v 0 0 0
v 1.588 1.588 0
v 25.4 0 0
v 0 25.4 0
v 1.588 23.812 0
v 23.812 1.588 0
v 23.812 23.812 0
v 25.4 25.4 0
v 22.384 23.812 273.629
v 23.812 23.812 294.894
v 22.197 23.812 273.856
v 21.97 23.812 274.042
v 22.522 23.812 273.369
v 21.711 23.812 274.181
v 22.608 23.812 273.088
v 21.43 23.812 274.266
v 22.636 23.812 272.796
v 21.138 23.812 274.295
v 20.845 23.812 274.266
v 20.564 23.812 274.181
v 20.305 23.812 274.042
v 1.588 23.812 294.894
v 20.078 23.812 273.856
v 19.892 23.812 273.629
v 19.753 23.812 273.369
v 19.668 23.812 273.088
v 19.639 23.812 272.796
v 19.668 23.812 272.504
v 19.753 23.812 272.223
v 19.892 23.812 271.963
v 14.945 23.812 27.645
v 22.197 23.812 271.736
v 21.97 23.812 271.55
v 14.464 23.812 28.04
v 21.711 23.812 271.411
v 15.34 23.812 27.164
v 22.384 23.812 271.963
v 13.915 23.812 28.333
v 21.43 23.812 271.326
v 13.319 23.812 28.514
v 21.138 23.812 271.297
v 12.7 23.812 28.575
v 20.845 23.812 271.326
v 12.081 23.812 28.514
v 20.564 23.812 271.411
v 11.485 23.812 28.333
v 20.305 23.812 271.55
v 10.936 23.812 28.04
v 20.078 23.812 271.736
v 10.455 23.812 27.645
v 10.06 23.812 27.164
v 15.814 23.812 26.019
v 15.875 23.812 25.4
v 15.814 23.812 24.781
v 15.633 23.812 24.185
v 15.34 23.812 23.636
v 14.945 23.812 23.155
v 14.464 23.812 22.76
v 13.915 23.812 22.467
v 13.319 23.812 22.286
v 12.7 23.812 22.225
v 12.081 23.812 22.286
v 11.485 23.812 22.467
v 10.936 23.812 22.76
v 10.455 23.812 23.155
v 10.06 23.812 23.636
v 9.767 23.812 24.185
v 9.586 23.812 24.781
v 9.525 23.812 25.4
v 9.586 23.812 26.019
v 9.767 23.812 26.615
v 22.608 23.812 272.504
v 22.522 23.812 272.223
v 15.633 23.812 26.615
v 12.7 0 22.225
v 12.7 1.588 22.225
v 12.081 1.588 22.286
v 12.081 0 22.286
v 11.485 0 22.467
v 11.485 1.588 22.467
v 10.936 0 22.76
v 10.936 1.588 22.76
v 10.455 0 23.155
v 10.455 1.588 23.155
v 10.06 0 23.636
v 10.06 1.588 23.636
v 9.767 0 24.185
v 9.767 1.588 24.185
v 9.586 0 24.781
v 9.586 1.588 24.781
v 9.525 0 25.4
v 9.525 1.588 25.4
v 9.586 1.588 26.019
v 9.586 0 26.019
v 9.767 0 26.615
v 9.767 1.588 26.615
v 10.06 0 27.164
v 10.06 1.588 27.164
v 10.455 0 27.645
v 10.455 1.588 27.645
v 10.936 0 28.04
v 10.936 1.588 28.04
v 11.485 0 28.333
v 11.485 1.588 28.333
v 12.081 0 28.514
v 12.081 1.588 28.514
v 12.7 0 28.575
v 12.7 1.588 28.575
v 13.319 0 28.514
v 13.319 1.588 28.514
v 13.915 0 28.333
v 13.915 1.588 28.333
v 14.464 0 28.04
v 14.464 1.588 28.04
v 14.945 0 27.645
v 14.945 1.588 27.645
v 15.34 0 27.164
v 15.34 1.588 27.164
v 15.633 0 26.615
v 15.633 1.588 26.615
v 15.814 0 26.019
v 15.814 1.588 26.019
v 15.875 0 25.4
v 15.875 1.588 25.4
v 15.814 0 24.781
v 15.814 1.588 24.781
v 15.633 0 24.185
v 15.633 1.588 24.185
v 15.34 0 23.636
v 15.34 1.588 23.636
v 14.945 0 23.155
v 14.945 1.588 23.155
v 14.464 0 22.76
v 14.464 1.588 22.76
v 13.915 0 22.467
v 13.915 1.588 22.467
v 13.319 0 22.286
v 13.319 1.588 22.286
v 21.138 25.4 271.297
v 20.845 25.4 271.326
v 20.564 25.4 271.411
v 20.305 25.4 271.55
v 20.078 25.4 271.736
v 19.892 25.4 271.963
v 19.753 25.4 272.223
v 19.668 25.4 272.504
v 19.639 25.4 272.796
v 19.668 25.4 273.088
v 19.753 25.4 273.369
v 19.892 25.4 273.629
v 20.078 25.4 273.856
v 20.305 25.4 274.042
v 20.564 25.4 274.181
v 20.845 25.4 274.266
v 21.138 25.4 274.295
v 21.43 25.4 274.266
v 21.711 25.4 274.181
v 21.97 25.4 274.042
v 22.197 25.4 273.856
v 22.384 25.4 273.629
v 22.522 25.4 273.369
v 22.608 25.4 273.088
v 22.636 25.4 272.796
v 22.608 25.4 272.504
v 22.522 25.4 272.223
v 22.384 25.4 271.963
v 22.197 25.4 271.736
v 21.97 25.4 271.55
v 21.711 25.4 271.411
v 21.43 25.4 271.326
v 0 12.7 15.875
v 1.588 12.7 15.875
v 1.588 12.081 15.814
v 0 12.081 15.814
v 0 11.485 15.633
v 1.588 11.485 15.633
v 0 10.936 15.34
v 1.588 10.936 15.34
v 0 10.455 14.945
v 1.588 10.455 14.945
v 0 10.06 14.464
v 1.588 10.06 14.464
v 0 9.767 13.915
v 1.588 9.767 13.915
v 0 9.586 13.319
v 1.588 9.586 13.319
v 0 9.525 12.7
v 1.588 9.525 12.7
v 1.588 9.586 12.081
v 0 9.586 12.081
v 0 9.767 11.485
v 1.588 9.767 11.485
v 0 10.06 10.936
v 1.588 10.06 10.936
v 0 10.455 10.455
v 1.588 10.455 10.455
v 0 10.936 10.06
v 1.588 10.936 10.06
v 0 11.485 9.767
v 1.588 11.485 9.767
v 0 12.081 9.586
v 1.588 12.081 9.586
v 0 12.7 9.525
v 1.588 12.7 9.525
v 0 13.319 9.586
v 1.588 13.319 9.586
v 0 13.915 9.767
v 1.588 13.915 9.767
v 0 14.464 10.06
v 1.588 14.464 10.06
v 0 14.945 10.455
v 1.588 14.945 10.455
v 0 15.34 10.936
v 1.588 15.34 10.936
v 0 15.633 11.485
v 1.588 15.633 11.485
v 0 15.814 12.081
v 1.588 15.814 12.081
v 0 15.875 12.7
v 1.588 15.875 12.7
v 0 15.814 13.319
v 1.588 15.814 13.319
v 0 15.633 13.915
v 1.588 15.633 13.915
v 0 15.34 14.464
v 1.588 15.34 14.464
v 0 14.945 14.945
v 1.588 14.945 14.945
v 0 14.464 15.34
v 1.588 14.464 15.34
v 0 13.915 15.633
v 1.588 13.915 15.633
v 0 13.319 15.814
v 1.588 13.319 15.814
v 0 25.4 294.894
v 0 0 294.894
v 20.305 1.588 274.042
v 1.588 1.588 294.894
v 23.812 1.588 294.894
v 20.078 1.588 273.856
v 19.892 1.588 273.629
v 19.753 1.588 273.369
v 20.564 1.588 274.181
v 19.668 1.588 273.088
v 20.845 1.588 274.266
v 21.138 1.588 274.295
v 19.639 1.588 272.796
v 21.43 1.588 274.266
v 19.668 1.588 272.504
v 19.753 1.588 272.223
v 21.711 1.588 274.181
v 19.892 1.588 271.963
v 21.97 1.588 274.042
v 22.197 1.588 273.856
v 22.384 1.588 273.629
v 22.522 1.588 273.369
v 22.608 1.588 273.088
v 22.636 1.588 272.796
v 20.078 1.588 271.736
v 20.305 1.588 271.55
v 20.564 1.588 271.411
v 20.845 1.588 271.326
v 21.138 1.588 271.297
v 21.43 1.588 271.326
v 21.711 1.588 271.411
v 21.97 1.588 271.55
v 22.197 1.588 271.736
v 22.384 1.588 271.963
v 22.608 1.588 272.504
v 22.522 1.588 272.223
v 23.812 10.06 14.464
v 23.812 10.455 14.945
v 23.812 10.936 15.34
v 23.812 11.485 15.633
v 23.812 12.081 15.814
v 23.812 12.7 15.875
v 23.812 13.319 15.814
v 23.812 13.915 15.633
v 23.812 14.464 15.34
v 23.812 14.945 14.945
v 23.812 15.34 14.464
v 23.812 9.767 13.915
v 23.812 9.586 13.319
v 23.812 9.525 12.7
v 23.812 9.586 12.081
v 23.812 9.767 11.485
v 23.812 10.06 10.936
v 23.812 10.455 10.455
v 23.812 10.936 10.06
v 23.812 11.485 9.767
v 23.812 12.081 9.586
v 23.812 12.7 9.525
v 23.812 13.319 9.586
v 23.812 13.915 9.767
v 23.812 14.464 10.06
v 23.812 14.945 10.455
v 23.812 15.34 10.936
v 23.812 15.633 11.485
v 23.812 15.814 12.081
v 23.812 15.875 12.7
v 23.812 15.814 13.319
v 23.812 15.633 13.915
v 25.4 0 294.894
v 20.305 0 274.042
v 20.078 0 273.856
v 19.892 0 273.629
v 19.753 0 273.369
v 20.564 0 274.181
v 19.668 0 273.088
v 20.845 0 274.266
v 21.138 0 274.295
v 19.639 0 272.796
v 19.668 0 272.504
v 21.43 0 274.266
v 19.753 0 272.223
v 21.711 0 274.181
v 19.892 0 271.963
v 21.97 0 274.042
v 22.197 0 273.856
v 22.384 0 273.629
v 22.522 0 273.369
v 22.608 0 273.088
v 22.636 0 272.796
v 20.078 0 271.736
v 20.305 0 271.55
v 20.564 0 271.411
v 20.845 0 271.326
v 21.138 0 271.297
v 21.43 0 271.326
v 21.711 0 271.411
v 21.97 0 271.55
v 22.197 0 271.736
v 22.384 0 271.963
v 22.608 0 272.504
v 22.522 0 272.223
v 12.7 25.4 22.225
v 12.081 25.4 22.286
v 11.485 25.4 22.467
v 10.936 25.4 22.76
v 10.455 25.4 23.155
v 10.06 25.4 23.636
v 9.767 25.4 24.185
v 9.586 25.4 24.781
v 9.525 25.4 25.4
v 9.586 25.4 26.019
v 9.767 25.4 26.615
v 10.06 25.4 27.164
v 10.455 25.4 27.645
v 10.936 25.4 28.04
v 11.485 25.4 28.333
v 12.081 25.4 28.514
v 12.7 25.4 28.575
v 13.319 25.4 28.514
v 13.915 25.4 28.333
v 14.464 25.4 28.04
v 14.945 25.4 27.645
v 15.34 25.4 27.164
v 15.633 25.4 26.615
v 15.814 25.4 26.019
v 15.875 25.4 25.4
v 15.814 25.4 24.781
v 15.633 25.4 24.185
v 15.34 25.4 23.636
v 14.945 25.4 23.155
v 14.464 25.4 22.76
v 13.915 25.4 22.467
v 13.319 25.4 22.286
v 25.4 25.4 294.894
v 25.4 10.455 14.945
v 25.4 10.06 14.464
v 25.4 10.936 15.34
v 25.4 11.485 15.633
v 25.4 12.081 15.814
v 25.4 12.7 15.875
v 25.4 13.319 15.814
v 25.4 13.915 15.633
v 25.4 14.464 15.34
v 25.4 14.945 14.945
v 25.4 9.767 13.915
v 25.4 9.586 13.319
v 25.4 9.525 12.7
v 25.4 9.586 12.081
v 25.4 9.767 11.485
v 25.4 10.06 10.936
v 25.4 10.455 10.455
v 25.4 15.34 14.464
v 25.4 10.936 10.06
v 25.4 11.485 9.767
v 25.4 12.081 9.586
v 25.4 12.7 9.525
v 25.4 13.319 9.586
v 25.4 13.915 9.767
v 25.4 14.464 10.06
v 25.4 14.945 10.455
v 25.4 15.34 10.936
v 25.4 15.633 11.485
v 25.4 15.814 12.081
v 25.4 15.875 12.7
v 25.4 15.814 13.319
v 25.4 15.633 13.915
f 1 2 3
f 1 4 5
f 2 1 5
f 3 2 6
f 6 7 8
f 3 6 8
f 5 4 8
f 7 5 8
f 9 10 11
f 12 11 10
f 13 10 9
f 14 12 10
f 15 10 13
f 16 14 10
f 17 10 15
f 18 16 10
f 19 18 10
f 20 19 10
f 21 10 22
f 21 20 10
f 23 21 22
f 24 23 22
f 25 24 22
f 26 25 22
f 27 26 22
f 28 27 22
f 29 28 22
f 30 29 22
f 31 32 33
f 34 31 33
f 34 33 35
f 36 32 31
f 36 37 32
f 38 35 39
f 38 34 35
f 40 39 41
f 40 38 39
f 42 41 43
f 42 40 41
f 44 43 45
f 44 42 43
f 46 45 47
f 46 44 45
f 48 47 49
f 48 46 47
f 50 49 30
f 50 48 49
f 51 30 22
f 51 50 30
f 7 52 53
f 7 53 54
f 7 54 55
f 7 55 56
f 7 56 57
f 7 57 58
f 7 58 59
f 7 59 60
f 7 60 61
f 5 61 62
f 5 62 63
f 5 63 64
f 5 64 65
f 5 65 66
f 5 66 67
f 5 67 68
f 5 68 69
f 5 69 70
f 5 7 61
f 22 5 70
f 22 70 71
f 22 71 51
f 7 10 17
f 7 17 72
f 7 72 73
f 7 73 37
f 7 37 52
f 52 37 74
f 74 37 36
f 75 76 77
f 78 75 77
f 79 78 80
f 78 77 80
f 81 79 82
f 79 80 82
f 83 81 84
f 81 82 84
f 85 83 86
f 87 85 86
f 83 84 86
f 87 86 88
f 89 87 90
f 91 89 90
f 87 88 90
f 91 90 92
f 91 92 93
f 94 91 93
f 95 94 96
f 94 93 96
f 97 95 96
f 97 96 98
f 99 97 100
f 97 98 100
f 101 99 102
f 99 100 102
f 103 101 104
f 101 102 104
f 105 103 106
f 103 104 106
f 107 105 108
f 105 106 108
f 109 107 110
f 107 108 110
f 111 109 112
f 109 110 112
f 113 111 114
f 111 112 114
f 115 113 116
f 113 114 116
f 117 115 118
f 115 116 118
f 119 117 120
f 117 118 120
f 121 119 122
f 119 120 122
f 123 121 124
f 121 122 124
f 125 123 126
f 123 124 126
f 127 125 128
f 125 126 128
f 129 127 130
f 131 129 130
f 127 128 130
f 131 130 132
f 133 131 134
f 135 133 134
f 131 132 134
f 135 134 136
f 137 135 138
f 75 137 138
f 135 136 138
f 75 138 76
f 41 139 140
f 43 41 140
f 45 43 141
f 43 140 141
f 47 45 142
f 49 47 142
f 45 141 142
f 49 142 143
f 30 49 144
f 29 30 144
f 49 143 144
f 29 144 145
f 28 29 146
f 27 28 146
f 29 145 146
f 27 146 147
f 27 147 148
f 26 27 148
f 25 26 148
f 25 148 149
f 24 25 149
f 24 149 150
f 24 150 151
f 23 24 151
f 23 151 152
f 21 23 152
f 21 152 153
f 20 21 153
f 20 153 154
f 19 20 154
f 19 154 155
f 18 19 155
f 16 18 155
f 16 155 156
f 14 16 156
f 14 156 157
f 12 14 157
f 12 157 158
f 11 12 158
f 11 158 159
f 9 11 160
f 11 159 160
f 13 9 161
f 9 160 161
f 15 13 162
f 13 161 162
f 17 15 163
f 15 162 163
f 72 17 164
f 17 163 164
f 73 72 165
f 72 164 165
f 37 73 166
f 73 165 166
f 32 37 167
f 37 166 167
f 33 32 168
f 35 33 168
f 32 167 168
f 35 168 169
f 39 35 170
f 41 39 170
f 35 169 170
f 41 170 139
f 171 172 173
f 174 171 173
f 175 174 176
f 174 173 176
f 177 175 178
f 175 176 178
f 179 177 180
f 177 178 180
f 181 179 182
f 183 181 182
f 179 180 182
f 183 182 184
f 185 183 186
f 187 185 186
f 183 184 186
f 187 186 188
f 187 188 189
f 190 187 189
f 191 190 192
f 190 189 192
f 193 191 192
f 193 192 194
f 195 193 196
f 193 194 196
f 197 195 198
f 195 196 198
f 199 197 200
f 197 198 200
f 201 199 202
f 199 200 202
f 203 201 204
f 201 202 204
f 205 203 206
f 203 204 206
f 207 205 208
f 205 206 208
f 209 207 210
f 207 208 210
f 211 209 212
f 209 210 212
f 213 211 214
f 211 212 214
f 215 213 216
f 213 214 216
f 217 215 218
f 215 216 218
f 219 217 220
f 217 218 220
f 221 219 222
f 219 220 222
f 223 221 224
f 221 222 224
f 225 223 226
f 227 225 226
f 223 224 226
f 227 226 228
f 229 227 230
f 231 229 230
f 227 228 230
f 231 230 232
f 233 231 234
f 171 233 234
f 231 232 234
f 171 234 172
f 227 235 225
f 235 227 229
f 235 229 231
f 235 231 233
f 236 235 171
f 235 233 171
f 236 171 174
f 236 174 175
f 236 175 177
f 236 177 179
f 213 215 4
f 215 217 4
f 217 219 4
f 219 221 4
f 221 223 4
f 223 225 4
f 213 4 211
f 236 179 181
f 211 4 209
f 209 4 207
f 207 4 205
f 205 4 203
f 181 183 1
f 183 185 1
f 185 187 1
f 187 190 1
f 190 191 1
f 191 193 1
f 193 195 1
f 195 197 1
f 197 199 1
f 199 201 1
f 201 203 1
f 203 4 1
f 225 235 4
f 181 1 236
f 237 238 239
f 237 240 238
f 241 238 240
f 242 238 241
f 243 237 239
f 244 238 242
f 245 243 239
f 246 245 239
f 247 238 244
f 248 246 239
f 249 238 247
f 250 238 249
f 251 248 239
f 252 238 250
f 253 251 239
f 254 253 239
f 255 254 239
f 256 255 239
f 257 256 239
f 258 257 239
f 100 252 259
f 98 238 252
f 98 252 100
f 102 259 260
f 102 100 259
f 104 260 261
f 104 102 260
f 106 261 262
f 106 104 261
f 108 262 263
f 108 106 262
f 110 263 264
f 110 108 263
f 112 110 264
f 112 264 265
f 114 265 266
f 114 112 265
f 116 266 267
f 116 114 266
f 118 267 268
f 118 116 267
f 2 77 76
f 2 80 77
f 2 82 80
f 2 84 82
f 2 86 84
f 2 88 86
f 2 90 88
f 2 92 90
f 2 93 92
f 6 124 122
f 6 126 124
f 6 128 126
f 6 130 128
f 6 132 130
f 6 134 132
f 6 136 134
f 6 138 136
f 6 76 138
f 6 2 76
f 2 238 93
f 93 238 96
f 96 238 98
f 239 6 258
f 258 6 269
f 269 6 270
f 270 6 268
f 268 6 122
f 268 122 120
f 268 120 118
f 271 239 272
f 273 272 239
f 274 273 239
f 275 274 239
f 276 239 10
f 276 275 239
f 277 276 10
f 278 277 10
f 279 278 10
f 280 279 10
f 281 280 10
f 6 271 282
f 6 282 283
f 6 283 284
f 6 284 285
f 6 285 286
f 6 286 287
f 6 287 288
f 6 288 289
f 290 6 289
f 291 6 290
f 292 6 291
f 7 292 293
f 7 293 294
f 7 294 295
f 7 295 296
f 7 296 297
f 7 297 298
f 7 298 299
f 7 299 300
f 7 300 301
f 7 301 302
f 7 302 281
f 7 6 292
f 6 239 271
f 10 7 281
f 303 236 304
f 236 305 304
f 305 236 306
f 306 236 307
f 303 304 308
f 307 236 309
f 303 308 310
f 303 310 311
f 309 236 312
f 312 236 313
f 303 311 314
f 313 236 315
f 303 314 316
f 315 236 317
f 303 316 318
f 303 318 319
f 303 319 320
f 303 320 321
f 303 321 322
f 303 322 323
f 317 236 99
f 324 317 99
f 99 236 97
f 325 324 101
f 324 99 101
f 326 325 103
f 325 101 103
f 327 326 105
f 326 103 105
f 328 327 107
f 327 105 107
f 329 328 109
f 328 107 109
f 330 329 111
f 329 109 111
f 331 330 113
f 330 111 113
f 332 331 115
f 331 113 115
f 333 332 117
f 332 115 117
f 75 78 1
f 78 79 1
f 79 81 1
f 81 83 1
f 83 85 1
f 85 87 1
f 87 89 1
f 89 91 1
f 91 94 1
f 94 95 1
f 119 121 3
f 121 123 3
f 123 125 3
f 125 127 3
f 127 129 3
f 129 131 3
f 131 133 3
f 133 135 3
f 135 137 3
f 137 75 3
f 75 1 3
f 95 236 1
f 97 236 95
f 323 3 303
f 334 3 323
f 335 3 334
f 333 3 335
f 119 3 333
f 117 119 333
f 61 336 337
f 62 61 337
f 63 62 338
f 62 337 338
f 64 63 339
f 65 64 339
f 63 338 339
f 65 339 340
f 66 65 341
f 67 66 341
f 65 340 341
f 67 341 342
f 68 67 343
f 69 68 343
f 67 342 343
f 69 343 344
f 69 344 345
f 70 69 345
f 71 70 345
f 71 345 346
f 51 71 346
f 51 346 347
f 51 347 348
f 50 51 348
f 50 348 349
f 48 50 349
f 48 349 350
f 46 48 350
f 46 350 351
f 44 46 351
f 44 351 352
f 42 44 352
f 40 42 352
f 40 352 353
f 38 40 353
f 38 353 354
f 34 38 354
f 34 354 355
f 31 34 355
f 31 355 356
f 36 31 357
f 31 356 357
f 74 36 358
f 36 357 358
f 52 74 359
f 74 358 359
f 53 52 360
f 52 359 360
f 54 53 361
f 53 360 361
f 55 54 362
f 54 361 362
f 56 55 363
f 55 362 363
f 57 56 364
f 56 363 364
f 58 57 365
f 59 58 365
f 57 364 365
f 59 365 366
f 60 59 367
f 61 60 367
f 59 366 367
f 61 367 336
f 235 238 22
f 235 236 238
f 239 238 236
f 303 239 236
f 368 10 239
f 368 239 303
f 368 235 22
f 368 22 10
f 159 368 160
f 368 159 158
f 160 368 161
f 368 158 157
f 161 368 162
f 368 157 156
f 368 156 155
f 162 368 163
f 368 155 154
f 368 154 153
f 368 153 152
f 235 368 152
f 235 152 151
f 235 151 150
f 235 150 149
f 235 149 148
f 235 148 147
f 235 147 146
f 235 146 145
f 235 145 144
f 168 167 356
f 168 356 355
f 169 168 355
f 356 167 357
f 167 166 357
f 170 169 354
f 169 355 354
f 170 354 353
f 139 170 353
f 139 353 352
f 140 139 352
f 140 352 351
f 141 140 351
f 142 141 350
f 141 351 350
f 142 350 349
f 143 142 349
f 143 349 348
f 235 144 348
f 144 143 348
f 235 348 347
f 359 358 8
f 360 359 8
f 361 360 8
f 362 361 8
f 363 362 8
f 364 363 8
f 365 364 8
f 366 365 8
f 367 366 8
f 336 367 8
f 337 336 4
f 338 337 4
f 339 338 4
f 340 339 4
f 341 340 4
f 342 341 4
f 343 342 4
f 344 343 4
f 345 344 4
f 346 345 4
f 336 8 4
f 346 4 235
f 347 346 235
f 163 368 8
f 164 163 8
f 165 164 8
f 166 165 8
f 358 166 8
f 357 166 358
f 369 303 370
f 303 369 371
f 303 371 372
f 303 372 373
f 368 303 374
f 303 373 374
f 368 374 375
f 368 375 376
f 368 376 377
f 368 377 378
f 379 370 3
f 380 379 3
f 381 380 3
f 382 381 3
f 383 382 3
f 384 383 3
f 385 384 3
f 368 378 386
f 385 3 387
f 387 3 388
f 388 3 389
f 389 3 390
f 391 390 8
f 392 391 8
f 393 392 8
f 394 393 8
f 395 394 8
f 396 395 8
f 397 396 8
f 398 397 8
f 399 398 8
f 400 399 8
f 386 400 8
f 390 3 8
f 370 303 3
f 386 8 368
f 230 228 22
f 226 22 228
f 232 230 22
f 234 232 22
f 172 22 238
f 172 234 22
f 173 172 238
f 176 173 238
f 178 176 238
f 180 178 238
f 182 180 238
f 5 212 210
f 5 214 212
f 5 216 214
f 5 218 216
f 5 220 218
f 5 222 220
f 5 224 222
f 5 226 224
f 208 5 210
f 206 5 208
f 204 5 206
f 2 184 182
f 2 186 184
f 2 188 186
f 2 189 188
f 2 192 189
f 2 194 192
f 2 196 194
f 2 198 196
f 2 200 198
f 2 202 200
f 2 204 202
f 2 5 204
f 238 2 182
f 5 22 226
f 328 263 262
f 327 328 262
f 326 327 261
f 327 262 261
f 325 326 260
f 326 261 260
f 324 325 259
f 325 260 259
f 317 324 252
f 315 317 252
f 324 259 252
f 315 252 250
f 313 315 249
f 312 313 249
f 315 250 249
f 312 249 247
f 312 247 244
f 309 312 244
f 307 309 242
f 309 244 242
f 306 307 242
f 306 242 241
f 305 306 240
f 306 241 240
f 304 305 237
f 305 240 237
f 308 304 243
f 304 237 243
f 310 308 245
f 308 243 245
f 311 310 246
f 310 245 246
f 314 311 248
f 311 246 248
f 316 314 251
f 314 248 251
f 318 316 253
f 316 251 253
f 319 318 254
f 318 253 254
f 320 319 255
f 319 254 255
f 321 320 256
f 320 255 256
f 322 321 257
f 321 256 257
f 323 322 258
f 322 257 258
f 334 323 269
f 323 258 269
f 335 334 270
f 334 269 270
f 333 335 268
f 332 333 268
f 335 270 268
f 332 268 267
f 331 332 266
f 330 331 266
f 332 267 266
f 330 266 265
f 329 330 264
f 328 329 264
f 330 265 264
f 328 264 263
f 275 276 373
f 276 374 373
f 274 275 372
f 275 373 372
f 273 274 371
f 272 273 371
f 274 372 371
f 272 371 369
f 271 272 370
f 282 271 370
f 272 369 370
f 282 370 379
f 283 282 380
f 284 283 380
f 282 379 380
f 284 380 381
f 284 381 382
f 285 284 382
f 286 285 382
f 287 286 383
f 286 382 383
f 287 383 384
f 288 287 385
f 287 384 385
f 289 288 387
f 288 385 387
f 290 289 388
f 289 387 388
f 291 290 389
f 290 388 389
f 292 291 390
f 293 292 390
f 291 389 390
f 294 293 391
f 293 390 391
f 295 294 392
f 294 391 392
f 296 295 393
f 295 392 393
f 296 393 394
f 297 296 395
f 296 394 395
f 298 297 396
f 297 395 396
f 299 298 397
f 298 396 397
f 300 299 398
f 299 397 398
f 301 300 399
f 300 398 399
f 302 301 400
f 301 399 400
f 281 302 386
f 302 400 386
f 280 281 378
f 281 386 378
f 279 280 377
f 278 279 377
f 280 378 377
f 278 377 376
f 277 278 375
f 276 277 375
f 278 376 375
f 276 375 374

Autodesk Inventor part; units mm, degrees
ref_plane "YZ Plane" through (0, 0, 0) normal (1, 0, 0) x (0, 1, 0)
ref_plane "XZ Plane" through (0, 0, 0) normal (0, 1, 0) x (-1, 0, 0)
ref_plane "XY Plane" through (0, 0, 0) normal (0, 0, 1) x (1, 0, 0)
sketch "Sketch1" plane through (0, 0, 0) normal (0, 0, 1) x (1, 0, 0)
  line L0 (0, 0) -> (25.4, 0)
  line L1 (25.4, 0) -> (25.4, 25.4)
  line L2 (25.4, 25.4) -> (0, 25.4)
  line L3 (0, 25.4) -> (0, 0)
  line L4 (1.5875, 1.5875) -> (23.8125, 1.5875)
  line L5 (23.8125, 1.5875) -> (23.8125, 23.8125)
  line L6 (23.8125, 23.8125) -> (1.5875, 23.8125)
  line L7 (1.5875, 23.8125) -> (1.5875, 1.5875)
  dimension "d0" = 25.4
  dimension "d1" = 25.4
  dimension "d2" = 1.5875
  dimension "d3" = 1.5875
  dimension "d4" = 1.5875
  dimension "d5" = 1.5875
extrude "Extrusion1" add sketch "Sketch1" along normal blind 294.894
sketch "Sketch2" plane through (0, 0, 0) normal (0, -1, 0) x (1, 0, 0)
  line L0 (0, 294.894) -> (25.4, 294.894) projected
  point P0 (21.1377, 272.796)
  dimension "d15" = 22.098
hole "Hole1" at (21.1377, 0, 272.796) direction (0, 1, 0) diameter 2.9972 end through all
sketch "Sketch3" plane through (0, 0, 0) normal (-1, 0, 0) x (0, 0, 1)
  line L0 (0, 25.4) -> (0, 0) projected
  line L1 (0, 25.4) -> (294.894, 25.4) projected
  point P0 (12.7, 12.7)
  dimension "d16" = 12.7
  dimension "d17" = 12.7
hole "Hole2" at (0, 12.7, 12.7) direction (1, 0, 0) diameter 6.35 end through all
sketch "Sketch4" plane through (0, 0, 0) normal (0, -1, 0) x (1, 0, 0)
  line L0 (0, 0) -> (25.4, 0) projected
  line L1 (0, 0) -> (0, 294.894) projected
  point P0 (12.7, 25.4)
  dimension "d25" = 25.4
  dimension "d26" = 12.7
hole "Hole3" at (12.7, 0, 25.4) direction (0, 1, 0) diameter 6.35 end through all
properties part number "SwitchBarSupport" material "Aluminum 6061"
